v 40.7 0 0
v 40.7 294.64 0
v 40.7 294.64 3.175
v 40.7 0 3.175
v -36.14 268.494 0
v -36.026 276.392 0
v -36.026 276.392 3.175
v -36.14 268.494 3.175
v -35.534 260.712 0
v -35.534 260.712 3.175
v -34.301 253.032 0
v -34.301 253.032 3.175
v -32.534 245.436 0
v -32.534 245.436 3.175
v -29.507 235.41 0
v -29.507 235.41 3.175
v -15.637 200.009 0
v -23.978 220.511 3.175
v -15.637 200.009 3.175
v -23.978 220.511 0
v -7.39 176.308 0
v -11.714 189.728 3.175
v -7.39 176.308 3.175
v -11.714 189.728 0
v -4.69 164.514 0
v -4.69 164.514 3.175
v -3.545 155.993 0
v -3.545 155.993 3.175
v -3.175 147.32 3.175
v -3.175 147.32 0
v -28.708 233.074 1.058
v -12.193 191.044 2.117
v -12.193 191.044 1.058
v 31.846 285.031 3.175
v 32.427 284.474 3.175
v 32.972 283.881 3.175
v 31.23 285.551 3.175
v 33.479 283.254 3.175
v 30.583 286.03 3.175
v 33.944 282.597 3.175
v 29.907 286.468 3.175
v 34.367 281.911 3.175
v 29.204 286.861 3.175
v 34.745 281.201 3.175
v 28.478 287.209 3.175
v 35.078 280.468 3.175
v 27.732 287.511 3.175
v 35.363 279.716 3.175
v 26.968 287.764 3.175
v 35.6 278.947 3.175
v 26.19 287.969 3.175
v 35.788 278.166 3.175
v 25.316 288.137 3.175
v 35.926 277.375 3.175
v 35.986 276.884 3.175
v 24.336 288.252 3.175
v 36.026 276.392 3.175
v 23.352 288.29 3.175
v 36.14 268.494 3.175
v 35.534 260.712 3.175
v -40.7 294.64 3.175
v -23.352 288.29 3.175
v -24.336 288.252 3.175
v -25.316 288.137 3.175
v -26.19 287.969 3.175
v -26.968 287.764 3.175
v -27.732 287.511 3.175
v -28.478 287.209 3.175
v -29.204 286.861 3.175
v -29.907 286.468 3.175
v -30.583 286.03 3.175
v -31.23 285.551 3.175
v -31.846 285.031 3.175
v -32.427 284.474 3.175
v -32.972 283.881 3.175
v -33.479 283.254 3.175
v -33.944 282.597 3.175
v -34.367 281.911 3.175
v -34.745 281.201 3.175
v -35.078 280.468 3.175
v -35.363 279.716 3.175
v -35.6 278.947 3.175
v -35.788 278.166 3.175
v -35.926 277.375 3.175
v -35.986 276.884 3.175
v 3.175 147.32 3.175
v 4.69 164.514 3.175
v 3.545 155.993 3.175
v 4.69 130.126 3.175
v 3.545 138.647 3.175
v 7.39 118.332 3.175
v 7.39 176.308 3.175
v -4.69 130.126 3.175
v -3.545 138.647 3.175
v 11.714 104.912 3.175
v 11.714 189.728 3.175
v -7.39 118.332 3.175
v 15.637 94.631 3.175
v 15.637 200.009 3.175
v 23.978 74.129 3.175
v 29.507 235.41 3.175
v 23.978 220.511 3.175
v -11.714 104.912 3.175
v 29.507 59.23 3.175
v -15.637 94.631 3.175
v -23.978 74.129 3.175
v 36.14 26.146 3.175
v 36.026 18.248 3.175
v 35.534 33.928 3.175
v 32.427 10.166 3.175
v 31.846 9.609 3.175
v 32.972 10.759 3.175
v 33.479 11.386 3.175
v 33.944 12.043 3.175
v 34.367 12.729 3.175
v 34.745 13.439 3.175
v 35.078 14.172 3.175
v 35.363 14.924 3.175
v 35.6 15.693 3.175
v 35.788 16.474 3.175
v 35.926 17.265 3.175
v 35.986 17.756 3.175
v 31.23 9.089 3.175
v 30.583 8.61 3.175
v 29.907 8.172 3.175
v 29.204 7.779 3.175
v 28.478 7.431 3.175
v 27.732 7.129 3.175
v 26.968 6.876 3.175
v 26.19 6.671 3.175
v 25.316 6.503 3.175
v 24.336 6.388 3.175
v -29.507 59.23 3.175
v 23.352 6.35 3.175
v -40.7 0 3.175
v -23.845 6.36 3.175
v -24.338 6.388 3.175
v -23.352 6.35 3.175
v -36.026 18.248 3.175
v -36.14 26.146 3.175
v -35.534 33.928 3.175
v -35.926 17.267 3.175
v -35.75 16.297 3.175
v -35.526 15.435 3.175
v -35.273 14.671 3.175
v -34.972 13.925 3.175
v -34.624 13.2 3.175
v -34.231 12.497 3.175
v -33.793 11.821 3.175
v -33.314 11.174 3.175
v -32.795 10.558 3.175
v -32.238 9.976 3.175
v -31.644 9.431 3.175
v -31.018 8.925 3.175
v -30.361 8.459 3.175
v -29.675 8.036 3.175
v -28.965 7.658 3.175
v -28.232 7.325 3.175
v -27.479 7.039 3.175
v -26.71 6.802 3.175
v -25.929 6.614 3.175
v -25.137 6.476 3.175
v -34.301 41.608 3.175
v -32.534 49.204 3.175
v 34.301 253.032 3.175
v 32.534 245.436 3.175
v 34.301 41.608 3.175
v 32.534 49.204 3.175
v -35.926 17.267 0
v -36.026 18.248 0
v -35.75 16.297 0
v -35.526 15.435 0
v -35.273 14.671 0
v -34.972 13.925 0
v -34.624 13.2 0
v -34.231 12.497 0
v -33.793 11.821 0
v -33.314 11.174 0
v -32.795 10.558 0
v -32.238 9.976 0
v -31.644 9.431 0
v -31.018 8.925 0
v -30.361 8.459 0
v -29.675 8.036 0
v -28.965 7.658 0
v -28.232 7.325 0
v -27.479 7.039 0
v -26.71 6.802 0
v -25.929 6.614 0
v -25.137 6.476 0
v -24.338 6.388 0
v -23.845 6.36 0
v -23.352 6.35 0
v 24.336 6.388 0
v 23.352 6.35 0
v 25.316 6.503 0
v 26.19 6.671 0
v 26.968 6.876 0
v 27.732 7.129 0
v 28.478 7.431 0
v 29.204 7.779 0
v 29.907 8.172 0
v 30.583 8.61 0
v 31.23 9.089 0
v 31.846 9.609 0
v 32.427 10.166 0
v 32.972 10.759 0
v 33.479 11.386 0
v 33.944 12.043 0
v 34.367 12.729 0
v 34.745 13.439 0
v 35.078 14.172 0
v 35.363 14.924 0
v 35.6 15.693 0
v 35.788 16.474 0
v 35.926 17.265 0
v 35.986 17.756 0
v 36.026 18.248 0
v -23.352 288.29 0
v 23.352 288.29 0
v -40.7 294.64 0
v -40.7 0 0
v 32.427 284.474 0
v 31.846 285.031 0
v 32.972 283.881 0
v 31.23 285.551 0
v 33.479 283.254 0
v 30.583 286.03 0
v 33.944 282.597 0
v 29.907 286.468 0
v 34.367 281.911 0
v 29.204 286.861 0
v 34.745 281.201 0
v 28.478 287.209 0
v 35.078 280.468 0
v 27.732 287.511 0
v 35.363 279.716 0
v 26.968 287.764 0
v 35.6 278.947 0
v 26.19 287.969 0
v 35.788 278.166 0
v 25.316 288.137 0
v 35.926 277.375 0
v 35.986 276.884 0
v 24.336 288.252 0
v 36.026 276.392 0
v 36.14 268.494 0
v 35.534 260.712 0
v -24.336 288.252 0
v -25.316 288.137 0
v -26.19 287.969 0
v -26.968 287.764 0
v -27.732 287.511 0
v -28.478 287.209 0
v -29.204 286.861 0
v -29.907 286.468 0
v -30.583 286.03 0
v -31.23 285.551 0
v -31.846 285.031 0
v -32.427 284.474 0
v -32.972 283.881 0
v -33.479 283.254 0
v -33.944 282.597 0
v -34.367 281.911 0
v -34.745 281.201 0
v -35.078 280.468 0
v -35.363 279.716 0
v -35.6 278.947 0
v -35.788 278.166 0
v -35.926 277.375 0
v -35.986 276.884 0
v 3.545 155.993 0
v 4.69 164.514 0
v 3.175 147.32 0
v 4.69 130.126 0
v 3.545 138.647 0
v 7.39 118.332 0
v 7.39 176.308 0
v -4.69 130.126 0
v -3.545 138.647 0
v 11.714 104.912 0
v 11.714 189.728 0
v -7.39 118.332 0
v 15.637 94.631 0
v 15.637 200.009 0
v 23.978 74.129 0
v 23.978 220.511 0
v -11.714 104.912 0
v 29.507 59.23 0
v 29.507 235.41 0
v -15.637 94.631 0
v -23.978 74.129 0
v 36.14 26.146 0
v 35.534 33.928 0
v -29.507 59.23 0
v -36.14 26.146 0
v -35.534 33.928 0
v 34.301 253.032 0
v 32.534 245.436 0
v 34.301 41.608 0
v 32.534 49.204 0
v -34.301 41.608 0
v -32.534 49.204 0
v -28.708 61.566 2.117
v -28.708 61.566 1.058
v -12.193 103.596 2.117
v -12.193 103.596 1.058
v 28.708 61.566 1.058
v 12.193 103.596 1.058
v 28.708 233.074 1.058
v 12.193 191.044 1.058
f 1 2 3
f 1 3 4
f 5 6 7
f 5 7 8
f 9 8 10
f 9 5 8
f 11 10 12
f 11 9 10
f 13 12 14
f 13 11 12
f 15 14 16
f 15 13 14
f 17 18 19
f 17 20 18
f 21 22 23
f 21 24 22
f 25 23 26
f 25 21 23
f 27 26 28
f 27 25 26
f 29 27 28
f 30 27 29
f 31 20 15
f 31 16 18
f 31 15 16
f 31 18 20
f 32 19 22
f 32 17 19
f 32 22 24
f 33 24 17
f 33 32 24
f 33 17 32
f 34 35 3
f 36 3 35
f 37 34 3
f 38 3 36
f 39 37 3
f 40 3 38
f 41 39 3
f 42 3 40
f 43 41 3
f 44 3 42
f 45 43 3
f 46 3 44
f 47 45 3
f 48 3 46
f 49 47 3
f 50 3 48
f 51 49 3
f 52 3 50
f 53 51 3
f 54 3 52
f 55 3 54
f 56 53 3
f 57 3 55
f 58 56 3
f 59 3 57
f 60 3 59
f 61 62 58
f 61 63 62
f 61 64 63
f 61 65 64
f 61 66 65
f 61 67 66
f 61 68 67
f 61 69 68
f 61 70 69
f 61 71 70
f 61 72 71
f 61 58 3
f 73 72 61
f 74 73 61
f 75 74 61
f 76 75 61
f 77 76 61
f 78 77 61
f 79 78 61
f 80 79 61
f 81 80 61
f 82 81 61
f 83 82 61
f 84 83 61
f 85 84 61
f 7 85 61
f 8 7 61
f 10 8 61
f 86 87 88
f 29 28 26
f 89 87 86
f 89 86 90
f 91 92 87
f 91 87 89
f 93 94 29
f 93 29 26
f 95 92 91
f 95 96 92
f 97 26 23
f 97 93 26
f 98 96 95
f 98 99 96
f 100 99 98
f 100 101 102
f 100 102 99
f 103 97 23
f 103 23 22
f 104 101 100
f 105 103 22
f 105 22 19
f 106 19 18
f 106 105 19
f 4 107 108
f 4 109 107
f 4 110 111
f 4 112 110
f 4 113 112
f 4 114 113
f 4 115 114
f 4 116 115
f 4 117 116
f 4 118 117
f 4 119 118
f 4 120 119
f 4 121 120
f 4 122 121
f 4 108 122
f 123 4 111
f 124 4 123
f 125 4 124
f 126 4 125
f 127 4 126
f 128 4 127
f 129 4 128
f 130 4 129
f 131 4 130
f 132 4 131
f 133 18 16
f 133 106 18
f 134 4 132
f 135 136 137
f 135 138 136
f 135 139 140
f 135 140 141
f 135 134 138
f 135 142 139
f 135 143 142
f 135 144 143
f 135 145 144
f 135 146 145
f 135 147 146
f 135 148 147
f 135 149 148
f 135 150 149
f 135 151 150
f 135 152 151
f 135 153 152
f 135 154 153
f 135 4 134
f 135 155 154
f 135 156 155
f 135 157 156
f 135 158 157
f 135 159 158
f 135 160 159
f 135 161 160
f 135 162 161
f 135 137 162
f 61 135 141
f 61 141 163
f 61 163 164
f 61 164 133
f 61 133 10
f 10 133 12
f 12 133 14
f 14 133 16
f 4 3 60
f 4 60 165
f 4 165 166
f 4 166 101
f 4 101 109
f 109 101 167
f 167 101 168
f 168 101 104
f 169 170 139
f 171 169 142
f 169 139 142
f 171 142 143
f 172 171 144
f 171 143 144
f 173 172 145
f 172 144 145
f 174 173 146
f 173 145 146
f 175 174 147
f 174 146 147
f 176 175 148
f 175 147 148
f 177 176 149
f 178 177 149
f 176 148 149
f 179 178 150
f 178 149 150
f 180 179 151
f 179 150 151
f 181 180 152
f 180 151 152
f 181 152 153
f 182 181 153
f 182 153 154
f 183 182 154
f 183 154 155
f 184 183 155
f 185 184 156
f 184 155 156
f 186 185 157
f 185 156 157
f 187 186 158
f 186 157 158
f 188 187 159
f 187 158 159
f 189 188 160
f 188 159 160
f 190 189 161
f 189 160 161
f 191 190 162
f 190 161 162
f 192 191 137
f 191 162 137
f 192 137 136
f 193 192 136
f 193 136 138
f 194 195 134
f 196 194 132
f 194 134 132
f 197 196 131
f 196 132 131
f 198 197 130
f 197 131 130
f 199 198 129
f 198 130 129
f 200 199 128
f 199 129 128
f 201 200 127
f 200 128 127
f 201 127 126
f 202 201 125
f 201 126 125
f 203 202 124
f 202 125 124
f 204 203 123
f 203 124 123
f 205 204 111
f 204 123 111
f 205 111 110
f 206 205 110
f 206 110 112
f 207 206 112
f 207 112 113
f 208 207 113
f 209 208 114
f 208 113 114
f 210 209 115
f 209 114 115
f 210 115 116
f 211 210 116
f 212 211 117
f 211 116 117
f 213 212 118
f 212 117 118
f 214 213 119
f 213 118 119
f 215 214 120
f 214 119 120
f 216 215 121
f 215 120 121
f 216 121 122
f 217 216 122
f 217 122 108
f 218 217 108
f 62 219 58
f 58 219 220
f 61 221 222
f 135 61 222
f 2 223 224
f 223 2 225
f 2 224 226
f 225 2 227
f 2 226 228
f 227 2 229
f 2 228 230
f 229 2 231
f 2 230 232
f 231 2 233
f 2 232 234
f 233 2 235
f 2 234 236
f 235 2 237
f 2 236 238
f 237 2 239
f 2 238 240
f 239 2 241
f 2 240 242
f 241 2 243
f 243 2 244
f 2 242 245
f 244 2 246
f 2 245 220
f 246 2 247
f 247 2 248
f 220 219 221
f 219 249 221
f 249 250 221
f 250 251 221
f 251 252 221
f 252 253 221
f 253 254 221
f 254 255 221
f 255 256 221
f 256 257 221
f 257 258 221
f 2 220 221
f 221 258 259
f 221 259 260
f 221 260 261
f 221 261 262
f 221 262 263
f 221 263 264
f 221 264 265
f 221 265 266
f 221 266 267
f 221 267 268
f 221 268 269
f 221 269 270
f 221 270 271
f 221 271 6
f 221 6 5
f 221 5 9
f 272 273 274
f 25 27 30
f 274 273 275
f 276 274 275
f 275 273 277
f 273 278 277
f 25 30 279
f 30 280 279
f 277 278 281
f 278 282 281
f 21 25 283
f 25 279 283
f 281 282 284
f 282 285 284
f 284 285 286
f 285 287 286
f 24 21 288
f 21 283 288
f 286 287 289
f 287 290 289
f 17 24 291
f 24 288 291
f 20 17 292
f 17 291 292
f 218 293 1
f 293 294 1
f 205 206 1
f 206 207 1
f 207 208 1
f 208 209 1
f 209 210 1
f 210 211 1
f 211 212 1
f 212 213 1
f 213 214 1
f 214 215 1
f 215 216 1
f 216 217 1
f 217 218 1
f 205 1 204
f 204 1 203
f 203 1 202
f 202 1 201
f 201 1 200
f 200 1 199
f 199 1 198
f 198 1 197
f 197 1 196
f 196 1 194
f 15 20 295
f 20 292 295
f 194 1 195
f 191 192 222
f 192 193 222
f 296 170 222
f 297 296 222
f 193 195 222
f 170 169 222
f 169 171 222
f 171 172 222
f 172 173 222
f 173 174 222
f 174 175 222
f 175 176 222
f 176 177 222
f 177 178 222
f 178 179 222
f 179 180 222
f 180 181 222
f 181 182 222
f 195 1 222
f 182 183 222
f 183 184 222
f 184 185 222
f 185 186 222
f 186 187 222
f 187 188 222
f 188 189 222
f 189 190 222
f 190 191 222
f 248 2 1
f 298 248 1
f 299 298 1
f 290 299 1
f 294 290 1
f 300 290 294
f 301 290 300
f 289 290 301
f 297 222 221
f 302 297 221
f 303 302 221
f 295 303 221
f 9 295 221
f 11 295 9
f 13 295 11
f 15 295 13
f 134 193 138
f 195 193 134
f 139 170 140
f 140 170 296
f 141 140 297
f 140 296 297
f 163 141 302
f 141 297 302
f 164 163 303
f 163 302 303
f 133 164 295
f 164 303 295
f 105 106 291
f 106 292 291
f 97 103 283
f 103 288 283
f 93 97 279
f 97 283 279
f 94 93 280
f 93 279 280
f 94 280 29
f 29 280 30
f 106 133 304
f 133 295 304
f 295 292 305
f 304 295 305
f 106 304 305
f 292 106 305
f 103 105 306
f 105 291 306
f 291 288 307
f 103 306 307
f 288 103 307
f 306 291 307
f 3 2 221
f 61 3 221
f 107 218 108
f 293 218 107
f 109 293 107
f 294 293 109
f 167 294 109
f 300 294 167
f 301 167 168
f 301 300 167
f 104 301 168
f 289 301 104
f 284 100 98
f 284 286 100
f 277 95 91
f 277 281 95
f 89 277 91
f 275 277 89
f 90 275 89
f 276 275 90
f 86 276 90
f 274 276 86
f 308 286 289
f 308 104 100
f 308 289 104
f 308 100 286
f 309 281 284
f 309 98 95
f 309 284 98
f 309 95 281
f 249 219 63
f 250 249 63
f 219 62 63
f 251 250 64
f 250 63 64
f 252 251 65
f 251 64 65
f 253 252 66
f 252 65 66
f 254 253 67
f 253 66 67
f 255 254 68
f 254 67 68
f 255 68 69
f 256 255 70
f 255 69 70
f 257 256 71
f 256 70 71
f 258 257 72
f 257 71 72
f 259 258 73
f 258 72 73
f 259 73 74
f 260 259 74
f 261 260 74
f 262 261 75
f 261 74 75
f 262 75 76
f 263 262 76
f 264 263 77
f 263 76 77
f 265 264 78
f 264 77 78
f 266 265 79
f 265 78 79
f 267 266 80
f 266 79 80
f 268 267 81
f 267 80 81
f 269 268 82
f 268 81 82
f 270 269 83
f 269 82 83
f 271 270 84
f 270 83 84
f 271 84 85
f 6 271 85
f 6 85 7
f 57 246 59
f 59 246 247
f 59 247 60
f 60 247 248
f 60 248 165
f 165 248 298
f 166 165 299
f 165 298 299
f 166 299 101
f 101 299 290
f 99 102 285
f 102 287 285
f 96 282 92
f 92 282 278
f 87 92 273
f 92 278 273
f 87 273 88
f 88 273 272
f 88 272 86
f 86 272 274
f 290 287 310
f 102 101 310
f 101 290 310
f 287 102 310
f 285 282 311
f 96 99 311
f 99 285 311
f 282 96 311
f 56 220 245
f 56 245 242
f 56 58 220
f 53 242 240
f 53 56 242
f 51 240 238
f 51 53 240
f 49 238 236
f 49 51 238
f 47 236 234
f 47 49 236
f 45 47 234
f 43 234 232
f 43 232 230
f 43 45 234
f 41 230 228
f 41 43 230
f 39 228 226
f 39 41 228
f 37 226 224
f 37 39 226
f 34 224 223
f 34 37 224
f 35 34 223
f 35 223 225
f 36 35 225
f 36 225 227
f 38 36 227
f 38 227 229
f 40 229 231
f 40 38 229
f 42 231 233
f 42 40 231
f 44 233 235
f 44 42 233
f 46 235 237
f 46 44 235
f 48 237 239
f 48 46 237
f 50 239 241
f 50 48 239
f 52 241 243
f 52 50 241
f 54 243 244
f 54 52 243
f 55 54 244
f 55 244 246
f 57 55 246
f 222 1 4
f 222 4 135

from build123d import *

# Parameters (mm, degrees)
BOSS_EXTRUDE1_DEPTH = 3.175
FILLET1_R           = 12.7


with BuildPart() as part:
    # Sketch1 → Boss-Extrude1 (new body)
    with BuildSketch(Plane.XY):
        with BuildLine():
            Line((34.35, 6.35), (0, 6.35))
            Line((0, 6.35), (0, 0))
            Line((0, 0), (40.7, 0))
            Line((40.7, 0), (40.7, 147.32))
            Line((40.7, 147.32), (3.175, 147.32))
            add(Edge.make_bspline(
                [(34.35, 6.35), (45.415498484, 56.545116153), (2.852403288, 97.787684056), (3.175, 147.32)],
                knots=[0, 0, 0, 0, 1, 1, 1, 1], degree=3))
        make_face()
    extrude(amount=BOSS_EXTRUDE1_DEPTH)

    # Mirror1: part across plane


with BuildPart() as part_1:
    add(part.part)
    add(part.part.mirror(Plane(origin=(0, 0, 3.175), x_dir=(0, 0, 1), z_dir=(-1, 0, 0))))

    # Mirror2: part across plane


with BuildPart() as part_2:
    add(part_1.part)
    add(part_1.part.mirror(Plane(origin=(-3.175, 147.32, 3.175), x_dir=(0, 0, 1), z_dir=(0, 1, 0))))

    # Fillet1
    fillet1_edges = [part_2.edges().sort_by_distance(p)[0] for p in [
        (34.35, 6.35, 1.5875),
        (-34.35, 6.35, 1.5875),
        (34.35, 288.29, 1.5875),
        (-34.35, 288.29, 1.5875),
    ]]
    fillet(fillet1_edges, radius=FILLET1_R)


solid = part_2.part
